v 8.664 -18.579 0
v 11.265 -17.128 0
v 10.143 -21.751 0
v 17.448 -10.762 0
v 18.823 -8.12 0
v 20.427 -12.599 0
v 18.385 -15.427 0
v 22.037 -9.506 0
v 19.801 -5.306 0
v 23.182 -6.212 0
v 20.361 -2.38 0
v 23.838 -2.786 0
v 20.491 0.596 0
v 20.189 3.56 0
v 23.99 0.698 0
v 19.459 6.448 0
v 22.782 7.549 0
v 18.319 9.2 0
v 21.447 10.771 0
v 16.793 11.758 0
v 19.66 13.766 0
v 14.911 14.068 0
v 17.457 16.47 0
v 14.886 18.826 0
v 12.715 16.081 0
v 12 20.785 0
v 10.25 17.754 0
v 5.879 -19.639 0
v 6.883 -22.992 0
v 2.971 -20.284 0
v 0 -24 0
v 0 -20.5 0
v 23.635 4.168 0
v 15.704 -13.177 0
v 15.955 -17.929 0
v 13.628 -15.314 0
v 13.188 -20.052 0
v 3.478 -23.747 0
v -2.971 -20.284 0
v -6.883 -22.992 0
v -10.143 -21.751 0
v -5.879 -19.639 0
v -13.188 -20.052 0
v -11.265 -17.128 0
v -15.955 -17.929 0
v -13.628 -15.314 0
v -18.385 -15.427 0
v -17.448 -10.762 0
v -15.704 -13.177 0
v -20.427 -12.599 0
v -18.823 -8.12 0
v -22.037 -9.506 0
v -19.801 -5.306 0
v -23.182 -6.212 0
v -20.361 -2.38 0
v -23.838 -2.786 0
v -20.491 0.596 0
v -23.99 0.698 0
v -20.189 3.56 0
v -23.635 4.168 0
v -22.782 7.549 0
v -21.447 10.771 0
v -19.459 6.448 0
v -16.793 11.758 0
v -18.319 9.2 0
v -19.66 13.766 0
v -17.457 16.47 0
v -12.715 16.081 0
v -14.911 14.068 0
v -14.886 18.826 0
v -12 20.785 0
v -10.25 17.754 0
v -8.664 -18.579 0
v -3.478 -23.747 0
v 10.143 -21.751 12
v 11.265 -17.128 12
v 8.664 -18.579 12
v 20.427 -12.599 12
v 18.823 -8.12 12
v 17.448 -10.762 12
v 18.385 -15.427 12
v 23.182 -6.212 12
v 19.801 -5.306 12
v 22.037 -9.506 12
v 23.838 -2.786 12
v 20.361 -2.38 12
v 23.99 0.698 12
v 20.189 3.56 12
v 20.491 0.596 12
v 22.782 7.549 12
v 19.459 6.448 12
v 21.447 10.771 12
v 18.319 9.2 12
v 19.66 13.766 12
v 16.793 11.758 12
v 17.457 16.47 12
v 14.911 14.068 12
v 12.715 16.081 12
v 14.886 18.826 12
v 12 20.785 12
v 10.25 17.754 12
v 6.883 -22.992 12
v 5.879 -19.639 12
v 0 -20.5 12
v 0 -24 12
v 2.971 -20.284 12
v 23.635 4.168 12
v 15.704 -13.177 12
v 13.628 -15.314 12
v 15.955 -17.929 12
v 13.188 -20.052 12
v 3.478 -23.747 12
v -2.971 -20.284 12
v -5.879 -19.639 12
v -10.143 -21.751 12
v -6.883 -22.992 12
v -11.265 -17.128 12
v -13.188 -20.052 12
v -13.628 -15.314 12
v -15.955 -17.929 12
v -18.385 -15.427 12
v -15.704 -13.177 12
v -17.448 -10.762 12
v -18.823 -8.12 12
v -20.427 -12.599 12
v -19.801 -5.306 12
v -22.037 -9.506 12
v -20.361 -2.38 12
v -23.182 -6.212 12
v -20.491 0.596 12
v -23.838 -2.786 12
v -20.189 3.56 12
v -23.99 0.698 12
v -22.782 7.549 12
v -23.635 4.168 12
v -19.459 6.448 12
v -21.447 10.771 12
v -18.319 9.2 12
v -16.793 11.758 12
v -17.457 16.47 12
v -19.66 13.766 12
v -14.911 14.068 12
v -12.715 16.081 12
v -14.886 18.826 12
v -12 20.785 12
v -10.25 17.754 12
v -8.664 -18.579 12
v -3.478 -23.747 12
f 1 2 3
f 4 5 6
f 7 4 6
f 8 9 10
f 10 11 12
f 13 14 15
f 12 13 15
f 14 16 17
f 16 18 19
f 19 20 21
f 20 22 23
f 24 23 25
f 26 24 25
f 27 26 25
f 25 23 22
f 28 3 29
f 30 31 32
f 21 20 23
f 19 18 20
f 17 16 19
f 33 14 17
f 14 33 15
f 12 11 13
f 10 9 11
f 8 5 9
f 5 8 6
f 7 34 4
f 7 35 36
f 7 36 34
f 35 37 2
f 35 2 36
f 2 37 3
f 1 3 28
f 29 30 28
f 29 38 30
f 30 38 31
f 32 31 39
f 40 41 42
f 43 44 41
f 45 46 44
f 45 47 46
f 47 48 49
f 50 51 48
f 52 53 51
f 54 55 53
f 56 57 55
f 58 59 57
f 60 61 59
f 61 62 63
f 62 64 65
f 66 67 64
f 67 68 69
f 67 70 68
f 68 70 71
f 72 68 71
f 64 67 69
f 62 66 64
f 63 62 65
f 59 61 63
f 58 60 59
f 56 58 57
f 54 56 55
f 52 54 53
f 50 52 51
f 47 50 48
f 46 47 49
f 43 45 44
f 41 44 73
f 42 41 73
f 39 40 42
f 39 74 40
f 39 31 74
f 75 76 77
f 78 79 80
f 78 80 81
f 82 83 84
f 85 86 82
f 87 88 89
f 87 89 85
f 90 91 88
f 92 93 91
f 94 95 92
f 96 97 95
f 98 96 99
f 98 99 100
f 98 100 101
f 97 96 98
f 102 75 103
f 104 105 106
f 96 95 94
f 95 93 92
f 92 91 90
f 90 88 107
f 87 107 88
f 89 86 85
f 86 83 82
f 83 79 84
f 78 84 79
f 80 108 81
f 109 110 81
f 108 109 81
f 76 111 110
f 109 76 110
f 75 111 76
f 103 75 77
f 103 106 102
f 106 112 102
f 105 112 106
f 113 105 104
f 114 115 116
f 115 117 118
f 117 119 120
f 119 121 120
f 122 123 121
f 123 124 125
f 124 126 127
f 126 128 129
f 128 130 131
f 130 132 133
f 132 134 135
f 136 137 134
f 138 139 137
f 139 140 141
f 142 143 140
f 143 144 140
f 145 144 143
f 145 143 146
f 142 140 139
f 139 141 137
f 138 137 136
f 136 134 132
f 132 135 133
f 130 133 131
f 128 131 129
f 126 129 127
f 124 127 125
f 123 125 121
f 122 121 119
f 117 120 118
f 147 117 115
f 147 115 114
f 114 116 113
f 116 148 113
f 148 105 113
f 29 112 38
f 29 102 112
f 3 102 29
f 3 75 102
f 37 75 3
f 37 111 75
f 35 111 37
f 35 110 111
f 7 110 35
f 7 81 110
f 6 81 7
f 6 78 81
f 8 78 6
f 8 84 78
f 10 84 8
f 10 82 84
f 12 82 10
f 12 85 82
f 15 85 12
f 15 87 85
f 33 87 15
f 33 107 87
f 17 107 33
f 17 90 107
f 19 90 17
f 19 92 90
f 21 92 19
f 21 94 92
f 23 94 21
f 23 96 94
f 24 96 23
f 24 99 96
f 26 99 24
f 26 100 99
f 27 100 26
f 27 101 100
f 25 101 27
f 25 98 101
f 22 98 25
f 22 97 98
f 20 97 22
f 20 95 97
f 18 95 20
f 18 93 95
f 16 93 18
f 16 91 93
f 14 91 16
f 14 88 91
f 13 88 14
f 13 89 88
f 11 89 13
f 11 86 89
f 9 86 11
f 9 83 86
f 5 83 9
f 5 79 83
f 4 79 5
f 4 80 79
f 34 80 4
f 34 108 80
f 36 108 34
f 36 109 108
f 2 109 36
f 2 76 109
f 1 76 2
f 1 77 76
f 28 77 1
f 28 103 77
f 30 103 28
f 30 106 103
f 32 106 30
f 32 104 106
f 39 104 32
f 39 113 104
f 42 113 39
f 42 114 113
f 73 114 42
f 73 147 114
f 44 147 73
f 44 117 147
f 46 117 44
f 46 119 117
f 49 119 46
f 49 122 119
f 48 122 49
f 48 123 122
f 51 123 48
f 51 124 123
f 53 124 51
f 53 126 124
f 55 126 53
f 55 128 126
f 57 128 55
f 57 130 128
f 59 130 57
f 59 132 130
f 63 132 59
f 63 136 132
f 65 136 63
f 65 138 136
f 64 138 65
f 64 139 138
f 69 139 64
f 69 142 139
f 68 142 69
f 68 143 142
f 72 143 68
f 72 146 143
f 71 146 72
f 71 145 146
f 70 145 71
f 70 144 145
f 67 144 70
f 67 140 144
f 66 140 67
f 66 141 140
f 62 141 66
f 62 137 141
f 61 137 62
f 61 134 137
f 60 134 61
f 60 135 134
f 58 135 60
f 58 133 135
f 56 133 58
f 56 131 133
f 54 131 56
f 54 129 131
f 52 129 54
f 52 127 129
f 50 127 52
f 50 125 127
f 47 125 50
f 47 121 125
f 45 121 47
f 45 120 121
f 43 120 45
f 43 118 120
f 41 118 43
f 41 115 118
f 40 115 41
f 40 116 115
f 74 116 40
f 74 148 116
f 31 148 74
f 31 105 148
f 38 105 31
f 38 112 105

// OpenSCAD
$fn = 32;

// ----------------------------------------------------------------------
// Spring clip: 48 mm outside, 3.5 mm band, 60 degree opening
// ----------------------------------------------------------------------

// --- parameters (mm) ---
outer_r = 24;             // clip outside radius
inner_r = 20.5;           // clip bore radius
band = 3.5;               // band thickness
clip_w = 12;              // clip width
opening = 60;             // opening angle

clip_profile = [[-12, 20.785], [-14.886, 18.826], [-17.457, 16.47], [-19.66, 13.766], [-21.447, 10.771], [-22.782, 7.549], [-23.635, 4.168], [-23.99, 0.698], [-23.838, -2.786], [-23.182, -6.212], [-22.037, -9.506], [-20.427, -12.599], [-18.385, -15.427], [-15.955, -17.929], [-13.188, -20.052], [-10.143, -21.751], [-6.883, -22.992], [-3.478, -23.747], [0, -24], [3.478, -23.747], [6.883, -22.992], [10.143, -21.751], [13.188, -20.052], [15.955, -17.929], [18.385, -15.427], [20.427, -12.599], [22.037, -9.506], [23.182, -6.212], [23.838, -2.786], [23.99, 0.698], [23.635, 4.168], [22.782, 7.549], [21.447, 10.771], [19.66, 13.766], [17.457, 16.47], [14.886, 18.826], [12, 20.785], [10.25, 17.754], [12.715, 16.081], [14.911, 14.068], [16.793, 11.758], [18.319, 9.2], [19.459, 6.448], [20.189, 3.56], [20.491, 0.596], [20.361, -2.38], [19.801, -5.306], [18.823, -8.12], [17.448, -10.762], [15.704, -13.177], [13.628, -15.314], [11.265, -17.128], [8.664, -18.579], [5.879, -19.639], [2.971, -20.284], [0, -20.5], [-2.971, -20.284], [-5.879, -19.639], [-8.664, -18.579], [-11.265, -17.128], [-13.628, -15.314], [-15.704, -13.177], [-17.448, -10.762], [-18.823, -8.12], [-19.801, -5.306], [-20.361, -2.38], [-20.491, 0.596], [-20.189, 3.56], [-19.459, 6.448], [-18.319, 9.2], [-16.793, 11.758], [-14.911, 14.068], [-12.715, 16.081], [-10.25, 17.754]];

difference() {
  union() {
    linear_extrude(height = clip_w) polygon(clip_profile);
  }
}
